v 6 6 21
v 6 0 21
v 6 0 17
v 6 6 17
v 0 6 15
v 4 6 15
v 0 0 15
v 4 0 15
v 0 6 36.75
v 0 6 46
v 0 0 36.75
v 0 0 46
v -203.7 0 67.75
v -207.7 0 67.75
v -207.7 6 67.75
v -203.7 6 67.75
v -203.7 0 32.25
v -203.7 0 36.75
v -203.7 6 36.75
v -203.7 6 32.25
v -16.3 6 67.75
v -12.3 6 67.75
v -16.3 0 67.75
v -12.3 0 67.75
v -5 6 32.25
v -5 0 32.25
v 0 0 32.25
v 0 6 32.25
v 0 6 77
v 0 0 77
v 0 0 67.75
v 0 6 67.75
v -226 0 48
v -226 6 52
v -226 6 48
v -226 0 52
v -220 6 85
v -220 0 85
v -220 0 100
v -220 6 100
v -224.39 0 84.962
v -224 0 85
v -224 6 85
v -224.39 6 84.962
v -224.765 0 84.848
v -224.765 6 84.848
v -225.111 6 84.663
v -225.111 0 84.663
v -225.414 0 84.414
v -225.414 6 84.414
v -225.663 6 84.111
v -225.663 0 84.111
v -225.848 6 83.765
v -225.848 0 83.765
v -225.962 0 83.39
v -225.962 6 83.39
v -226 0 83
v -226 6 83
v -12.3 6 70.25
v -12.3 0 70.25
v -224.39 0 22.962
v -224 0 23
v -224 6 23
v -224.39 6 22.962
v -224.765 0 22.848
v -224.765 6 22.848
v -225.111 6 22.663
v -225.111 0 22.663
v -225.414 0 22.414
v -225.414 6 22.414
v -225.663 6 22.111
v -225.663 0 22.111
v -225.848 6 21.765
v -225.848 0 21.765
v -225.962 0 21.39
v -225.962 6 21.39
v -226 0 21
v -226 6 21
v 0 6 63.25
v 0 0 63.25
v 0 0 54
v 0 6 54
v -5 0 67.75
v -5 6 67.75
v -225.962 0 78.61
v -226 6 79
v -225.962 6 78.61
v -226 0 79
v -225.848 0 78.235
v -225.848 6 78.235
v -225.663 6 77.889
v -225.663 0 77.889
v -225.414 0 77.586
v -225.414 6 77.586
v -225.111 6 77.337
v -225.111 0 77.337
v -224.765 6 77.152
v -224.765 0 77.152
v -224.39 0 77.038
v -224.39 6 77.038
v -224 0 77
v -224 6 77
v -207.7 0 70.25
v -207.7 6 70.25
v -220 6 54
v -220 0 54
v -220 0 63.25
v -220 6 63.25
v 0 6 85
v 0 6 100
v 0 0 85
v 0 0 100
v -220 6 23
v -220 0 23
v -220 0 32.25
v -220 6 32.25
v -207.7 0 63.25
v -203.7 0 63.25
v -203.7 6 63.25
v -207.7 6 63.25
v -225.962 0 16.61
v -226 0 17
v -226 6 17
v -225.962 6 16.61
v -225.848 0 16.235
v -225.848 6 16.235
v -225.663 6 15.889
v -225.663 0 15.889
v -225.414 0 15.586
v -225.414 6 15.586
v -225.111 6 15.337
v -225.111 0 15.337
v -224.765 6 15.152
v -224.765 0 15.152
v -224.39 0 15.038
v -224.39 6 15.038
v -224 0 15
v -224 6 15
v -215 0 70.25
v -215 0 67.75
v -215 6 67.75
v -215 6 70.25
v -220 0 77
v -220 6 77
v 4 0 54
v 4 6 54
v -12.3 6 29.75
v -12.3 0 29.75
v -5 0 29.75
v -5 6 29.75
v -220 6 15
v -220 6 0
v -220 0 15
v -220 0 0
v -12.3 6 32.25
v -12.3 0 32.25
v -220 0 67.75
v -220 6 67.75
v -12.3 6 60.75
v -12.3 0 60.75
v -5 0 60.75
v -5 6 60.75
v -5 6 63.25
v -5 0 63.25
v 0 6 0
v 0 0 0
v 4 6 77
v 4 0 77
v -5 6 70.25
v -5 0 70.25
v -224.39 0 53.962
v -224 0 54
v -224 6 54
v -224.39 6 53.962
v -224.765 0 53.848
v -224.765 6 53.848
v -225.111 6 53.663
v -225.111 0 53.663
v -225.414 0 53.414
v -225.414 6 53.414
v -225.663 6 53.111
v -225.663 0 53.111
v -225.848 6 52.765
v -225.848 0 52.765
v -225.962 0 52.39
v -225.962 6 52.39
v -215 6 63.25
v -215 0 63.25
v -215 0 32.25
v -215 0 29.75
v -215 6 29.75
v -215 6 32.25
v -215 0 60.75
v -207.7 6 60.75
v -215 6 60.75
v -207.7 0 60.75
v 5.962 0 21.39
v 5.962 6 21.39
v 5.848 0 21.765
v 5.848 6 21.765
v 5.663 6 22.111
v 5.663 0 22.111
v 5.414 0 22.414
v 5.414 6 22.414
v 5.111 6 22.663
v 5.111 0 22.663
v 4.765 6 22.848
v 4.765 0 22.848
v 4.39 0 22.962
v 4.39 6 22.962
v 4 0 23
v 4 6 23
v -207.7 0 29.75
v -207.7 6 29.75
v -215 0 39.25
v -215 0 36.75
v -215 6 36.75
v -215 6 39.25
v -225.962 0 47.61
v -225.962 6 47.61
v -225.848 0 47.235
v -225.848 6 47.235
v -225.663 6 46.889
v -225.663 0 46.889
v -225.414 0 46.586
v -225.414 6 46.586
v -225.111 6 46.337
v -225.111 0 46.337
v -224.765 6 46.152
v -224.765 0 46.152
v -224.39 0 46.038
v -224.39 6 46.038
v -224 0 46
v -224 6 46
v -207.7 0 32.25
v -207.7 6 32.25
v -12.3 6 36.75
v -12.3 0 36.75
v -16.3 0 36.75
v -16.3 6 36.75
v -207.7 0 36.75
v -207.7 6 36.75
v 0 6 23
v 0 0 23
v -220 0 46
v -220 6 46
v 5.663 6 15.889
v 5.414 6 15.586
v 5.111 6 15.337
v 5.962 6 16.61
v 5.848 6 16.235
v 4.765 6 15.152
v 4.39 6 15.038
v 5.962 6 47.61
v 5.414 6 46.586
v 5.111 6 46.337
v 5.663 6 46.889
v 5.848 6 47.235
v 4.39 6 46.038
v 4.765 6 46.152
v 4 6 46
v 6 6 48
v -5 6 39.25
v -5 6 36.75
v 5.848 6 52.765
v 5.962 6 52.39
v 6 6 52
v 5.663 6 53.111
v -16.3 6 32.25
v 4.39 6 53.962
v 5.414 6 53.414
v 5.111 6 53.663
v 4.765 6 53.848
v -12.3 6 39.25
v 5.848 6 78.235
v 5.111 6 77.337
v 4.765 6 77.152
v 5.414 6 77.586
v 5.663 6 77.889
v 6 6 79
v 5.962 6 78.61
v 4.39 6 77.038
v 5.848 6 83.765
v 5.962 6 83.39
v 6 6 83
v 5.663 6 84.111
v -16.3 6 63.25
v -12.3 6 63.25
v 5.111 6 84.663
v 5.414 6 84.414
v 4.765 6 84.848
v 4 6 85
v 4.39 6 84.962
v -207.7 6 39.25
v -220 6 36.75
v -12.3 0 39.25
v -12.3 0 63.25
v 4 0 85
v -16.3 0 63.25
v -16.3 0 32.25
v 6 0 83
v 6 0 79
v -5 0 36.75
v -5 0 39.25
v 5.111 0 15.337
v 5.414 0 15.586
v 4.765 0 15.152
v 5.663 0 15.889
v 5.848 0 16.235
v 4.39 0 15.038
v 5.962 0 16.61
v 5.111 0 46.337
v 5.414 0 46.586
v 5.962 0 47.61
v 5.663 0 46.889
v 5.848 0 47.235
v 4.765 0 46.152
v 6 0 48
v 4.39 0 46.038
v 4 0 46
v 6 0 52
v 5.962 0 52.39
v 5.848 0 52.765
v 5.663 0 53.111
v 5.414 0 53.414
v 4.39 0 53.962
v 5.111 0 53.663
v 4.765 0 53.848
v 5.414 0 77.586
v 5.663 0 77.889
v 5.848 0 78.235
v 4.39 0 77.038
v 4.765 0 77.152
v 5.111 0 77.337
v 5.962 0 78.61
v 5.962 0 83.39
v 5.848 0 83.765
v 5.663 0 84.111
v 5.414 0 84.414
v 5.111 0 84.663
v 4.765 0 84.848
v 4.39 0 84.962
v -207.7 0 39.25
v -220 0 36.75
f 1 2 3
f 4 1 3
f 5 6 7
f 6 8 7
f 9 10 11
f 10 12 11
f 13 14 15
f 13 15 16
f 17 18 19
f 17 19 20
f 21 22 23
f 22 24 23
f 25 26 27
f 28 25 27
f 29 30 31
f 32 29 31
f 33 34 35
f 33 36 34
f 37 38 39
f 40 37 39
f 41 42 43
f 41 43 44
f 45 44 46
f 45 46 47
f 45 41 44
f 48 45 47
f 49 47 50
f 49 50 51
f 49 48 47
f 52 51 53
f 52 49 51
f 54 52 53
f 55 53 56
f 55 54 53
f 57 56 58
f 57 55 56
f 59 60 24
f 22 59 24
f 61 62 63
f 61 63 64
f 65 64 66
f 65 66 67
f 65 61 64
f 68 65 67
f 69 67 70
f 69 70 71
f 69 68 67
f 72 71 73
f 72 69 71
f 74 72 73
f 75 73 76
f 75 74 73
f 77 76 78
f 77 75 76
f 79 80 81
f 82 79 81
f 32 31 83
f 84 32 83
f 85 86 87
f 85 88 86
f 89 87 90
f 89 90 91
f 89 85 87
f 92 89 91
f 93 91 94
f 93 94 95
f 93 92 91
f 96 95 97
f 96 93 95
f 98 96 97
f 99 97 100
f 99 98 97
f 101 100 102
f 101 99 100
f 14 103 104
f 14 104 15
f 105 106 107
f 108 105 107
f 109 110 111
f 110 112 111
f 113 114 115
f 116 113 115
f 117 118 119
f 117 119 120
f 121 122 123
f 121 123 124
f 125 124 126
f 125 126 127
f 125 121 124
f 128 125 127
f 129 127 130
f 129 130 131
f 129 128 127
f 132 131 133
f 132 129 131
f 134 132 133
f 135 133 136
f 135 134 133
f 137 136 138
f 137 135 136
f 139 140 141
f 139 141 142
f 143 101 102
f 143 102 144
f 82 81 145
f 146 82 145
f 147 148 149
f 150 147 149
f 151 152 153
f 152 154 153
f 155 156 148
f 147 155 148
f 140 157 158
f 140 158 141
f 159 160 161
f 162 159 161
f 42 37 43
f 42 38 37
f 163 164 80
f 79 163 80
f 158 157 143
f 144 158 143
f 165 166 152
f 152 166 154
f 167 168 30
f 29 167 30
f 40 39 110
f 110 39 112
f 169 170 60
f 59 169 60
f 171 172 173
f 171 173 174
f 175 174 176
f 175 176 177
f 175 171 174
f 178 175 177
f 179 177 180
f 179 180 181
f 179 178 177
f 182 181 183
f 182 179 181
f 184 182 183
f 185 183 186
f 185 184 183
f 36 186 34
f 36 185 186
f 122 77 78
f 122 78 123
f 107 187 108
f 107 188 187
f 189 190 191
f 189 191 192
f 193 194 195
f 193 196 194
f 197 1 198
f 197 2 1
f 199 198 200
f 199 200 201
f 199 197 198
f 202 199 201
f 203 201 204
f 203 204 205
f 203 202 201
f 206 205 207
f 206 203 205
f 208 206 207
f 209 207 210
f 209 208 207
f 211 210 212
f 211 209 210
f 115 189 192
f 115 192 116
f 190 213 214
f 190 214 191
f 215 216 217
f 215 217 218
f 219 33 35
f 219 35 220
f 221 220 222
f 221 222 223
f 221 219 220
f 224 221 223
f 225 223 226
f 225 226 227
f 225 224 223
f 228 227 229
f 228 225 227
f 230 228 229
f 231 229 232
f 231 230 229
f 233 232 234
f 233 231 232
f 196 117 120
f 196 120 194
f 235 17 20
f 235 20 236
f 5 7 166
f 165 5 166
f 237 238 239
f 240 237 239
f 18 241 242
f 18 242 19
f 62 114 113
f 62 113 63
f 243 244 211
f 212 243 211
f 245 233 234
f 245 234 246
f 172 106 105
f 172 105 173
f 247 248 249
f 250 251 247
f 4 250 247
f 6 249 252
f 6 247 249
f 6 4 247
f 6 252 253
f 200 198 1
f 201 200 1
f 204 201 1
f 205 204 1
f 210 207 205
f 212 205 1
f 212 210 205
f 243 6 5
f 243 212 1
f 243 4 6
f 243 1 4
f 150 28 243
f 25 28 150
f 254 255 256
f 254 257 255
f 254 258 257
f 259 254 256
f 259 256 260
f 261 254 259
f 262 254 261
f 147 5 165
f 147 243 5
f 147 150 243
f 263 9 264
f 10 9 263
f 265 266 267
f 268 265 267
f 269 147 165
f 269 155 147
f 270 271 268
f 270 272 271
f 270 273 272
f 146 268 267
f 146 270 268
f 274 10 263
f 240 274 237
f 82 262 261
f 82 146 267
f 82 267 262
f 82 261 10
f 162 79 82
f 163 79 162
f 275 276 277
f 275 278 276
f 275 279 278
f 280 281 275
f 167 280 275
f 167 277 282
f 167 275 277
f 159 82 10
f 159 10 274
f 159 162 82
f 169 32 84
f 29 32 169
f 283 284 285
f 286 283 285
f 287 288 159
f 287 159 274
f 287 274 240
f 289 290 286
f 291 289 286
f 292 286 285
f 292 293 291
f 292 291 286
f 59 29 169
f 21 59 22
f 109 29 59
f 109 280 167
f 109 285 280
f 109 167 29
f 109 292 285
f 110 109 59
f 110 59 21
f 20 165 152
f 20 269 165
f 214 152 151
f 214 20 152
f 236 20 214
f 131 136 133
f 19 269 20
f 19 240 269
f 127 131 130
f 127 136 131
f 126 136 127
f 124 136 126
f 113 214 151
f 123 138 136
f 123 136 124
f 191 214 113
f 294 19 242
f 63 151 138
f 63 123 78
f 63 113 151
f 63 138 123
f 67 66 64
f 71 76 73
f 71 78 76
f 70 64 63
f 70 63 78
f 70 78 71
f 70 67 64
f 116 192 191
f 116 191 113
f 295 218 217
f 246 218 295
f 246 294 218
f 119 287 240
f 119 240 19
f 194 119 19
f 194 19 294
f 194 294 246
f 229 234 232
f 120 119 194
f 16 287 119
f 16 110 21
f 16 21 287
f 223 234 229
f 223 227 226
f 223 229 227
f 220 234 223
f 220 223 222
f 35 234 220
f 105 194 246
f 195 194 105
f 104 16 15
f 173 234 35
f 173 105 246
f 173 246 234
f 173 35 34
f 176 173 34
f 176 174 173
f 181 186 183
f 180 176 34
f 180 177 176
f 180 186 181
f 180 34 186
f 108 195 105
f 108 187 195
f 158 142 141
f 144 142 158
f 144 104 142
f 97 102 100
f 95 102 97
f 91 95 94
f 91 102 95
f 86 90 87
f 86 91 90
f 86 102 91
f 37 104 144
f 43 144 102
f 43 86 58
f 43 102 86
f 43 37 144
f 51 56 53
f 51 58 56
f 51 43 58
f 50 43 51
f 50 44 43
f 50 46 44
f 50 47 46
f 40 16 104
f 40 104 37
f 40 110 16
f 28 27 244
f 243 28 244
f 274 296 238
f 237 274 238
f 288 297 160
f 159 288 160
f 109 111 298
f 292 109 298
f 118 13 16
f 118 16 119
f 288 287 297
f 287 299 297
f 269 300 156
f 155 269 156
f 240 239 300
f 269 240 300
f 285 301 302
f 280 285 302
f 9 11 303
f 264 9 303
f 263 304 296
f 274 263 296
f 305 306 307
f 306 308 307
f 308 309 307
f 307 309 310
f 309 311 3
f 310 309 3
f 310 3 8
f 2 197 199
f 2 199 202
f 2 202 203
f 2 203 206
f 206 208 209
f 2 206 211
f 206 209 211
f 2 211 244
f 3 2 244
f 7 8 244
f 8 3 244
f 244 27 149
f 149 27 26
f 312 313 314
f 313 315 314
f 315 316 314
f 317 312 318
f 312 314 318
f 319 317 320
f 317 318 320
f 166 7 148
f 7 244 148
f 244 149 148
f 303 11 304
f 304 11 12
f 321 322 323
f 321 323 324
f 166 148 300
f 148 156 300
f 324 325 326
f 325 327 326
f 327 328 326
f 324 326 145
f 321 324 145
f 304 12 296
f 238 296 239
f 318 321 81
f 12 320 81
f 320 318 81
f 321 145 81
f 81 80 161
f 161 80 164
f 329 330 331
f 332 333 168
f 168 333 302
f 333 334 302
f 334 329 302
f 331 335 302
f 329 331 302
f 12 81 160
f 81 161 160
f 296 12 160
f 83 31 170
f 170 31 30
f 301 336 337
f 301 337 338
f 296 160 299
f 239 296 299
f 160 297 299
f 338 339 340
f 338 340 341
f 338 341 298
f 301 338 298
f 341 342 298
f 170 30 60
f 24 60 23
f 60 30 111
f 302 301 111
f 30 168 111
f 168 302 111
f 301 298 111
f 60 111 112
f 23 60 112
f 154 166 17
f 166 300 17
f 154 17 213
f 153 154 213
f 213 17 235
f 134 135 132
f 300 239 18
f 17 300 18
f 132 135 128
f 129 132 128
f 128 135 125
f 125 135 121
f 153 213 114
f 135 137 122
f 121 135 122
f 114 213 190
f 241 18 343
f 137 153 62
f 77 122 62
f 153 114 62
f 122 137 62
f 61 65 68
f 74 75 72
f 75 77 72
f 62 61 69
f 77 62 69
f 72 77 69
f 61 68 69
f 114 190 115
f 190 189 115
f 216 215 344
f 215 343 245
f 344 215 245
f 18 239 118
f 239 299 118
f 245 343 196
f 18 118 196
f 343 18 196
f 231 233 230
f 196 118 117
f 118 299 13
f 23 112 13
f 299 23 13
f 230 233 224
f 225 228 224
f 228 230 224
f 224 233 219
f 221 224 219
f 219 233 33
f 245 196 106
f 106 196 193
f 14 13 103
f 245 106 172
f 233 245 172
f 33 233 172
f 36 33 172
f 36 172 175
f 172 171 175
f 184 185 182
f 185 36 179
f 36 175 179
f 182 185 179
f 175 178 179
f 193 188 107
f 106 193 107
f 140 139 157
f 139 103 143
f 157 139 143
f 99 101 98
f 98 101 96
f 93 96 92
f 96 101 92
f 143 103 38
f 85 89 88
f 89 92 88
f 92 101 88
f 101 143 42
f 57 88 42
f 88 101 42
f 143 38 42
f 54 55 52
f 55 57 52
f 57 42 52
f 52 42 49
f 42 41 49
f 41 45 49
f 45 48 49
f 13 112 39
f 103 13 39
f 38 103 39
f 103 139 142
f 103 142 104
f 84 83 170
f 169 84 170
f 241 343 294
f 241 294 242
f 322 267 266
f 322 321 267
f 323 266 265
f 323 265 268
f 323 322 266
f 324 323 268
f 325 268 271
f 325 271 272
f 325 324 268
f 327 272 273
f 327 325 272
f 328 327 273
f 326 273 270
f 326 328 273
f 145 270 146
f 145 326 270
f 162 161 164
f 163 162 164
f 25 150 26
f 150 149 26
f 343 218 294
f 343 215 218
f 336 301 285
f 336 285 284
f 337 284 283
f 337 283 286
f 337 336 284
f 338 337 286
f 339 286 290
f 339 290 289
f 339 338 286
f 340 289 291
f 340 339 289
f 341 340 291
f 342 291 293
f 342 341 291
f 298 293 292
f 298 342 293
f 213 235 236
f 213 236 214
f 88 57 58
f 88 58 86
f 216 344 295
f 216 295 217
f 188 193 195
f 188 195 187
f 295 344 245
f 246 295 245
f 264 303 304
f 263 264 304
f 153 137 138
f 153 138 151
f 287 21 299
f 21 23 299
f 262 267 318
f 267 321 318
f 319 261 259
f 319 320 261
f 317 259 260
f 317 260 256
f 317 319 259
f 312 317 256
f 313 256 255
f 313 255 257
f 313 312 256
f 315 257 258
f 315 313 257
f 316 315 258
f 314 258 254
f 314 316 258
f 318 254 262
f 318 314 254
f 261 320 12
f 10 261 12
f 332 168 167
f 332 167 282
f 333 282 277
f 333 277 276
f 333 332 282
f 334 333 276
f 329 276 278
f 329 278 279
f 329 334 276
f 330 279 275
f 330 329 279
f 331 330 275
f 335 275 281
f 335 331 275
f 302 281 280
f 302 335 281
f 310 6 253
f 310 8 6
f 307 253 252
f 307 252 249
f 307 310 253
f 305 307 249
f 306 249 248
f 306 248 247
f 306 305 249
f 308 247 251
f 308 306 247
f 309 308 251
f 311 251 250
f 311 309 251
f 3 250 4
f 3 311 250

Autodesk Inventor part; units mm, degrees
ref_plane "YZ Plane" through (0, 0, 0) normal (1, 0, 0) x (0, 1, 0)
ref_plane "XZ Plane" through (0, 0, 0) normal (0, 1, 0) x (-1, 0, 0)
ref_plane "XY Plane" through (0, 0, 0) normal (0, 0, 1) x (1, 0, 0)
sketch "Sketch1" plane through (0, 0, 0) normal (0, 1, 0) x (-1, 0, 0)
  line L0 (0, 0) -> (220, 0)
  line L1 (220, 0) -> (220, 100)
  line L2 (220, 100) -> (0, 100)
  line L3 (0, 100) -> (0, 0)
  dimension "d11" = 220
  dimension "d16" = 100
extrude "Extrusion3" add sketch "Sketch1" along normal blind 6
sketch "Sketch3" plane through (0, 0, 0) normal (0, -1, 0) x (1, 0, 0)
  line L0 (0, 100) -> (0, 0) projected
  line L1 (-220, 0) -> (-220, 100) projected
  line L2 (-220, 85) -> (-224, 85)
  line L3 (-226, 83) -> (-226, 79)
  line L4 (-224, 77) -> (-220, 77)
  line L5 (-220, 77) -> (-220, 85)
  line L6 (-220, 54) -> (-224, 54)
  line L7 (-226, 52) -> (-226, 48)
  line L8 (-224, 46) -> (-220, 46)
  line L9 (-220, 46) -> (-220, 54)
  line L10 (-220, 23) -> (-224, 23)
  line L11 (-226, 21) -> (-226, 17)
  line L12 (-224, 15) -> (-220, 15)
  line L13 (-220, 15) -> (-220, 23)
  line L14 (0, 85) -> (4, 85)
  line L15 (6, 83) -> (6, 79)
  line L16 (4, 77) -> (0, 77)
  line L17 (0, 77) -> (0, 85)
  line L18 (0, 54) -> (4, 54)
  line L19 (6, 52) -> (6, 48)
  line L20 (4, 46) -> (0, 46)
  line L21 (0, 46) -> (0, 54)
  line L22 (0, 23) -> (4, 23)
  line L23 (6, 21) -> (6, 17)
  line L24 (4, 15) -> (0, 15)
  line L25 (0, 15) -> (0, 23)
  arc A0 (-224, 85) -> (-226, 83) centre (-224, 83) ccw
  arc A1 (-226, 79) -> (-224, 77) centre (-224, 79) ccw
  arc A2 (-224, 54) -> (-226, 52) centre (-224, 52) ccw
  arc A3 (-226, 48) -> (-224, 46) centre (-224, 48) ccw
  arc A4 (-224, 23) -> (-226, 21) centre (-224, 21) ccw
  arc A5 (-226, 17) -> (-224, 15) centre (-224, 17) ccw
  arc A6 (6, 83) -> (4, 85) centre (4, 83) ccw
  arc A7 (4, 77) -> (6, 79) centre (4, 79) ccw
  arc A8 (6, 52) -> (4, 54) centre (4, 52) ccw
  arc A9 (4, 46) -> (6, 48) centre (4, 48) ccw
  arc A10 (6, 21) -> (4, 23) centre (4, 21) ccw
  arc A11 (4, 15) -> (6, 17) centre (4, 17) ccw
  line L26 (-222, 77) -> (-222, 54) construction
  line L27 (-222, 23) -> (-222, 46) construction
  point P0 (-226, 50)
  point P1 (-220, 50)
  dimension "d35" = 2
  dimension "d36" = 8
  dimension "d37" = 6
  dimension "d38" = 8
  dimension "d39" = 8
  dimension "d40" = 8
  dimension "d41" = 8
  dimension "d42" = 8
  dimension "d43" = 6
  dimension "d44" = 23
extrude "Extrusion4" add sketch "Sketch3" against normal blind 6
sketch "Sketch4" plane through (0, 0, 0) normal (0, -1, 0) x (1, 0, 0)
  line L0 (0, 0) -> (-220, 0) projected
  line L1 (-220, 100) -> (0, 100) projected
  line L2 (-220, 54) -> (-220, 77) projected
  line L3 (-220, 23) -> (-220, 46) projected
  line L4 (-203.7, 67.75) -> (-203.7, 63.25)
  line L5 (-220, 63.25) -> (-220, 67.75)
  line L6 (-215, 70.25) -> (-207.7, 70.25)
  line L7 (-207.7, 60.75) -> (-215, 60.75)
  line L8 (-220, 67.75) -> (-215, 67.75)
  line L9 (-207.7, 67.75) -> (-203.7, 67.75)
  line L10 (-203.7, 63.25) -> (-207.7, 63.25)
  line L11 (-215, 63.25) -> (-220, 63.25)
  line L12 (-215, 60.75) -> (-215, 63.25)
  line L13 (-215, 67.75) -> (-215, 70.25)
  line L14 (-207.7, 70.25) -> (-207.7, 67.75)
  line L15 (-207.7, 63.25) -> (-207.7, 60.75)
  line L16 (-203.7, 36.75) -> (-203.7, 32.25)
  line L17 (-220, 32.25) -> (-220, 36.75)
  line L18 (-215, 39.25) -> (-207.7, 39.25)
  line L19 (-207.7, 29.75) -> (-215, 29.75)
  line L20 (-220, 36.75) -> (-215, 36.75)
  line L21 (-207.7, 36.75) -> (-203.7, 36.75)
  line L22 (-203.7, 32.25) -> (-207.7, 32.25)
  line L23 (-215, 32.25) -> (-220, 32.25)
  line L24 (-215, 29.75) -> (-215, 32.25)
  line L25 (-215, 36.75) -> (-215, 39.25)
  line L26 (-207.7, 39.25) -> (-207.7, 36.75)
  line L27 (-207.7, 32.25) -> (-207.7, 29.75)
  line L28 (-110, 100) -> (-110, 0) construction
  line L29 (-16.3, 67.75) -> (-16.3, 63.25)
  line L30 (0, 63.25) -> (0, 67.75)
  line L31 (-5, 70.25) -> (-12.3, 70.25)
  line L32 (-12.3, 60.75) -> (-5, 60.75)
  line L33 (0, 67.75) -> (-5, 67.75)
  line L34 (-12.3, 67.75) -> (-16.3, 67.75)
  line L35 (-16.3, 63.25) -> (-12.3, 63.25)
  line L36 (-5, 63.25) -> (0, 63.25)
  line L37 (-5, 60.75) -> (-5, 63.25)
  line L38 (-5, 67.75) -> (-5, 70.25)
  line L39 (-12.3, 70.25) -> (-12.3, 67.75)
  line L40 (-12.3, 63.25) -> (-12.3, 60.75)
  line L41 (0, 36.75) -> (-5, 36.75)
  line L42 (-16.3, 36.75) -> (-16.3, 32.25)
  line L43 (-16.3, 32.25) -> (-12.3, 32.25)
  line L44 (-12.3, 32.25) -> (-12.3, 29.75)
  line L45 (-12.3, 39.25) -> (-12.3, 36.75)
  line L46 (-12.3, 29.75) -> (-5, 29.75)
  line L47 (-5, 29.75) -> (-5, 32.25)
  line L48 (-5, 36.75) -> (-5, 39.25)
  line L49 (-5, 39.25) -> (-12.3, 39.25)
  line L50 (-5, 32.25) -> (0, 32.25)
  line L51 (0, 32.25) -> (0, 36.75)
  line L52 (-12.3, 36.75) -> (-16.3, 36.75)
  point P0 (-220, 65.5)
  point P1 (-220, 34.5)
  point P2 (0, 65.5)
  point P3 (0, 34.5)
  dimension "d47" = 4.5
  dimension "d48" = 2.5
  dimension "d49" = 2.5
  dimension "d50" = 5
  dimension "d51" = 4
  dimension "d52" = 7.3
  dimension "d53" = 4.5
  dimension "d54" = 2.5
  dimension "d55" = 2.5
  dimension "d56" = 5
  dimension "d57" = 4
  dimension "d58" = 7.3
extrude "Extrusion5" cut sketch "Sketch4" against normal through all
equation "\"d38\" = d36"
equation "\"d39\" = d38"
equation "\"d40\" = d36"
equation "\"d41\" = d40"
equation "\"d42\" = d41"
equation "\"d43\" = d37"
equation "\"d49\" = d48"
equation "\"d55\" = d54"
properties part number "front_panel_2004_bottom"
